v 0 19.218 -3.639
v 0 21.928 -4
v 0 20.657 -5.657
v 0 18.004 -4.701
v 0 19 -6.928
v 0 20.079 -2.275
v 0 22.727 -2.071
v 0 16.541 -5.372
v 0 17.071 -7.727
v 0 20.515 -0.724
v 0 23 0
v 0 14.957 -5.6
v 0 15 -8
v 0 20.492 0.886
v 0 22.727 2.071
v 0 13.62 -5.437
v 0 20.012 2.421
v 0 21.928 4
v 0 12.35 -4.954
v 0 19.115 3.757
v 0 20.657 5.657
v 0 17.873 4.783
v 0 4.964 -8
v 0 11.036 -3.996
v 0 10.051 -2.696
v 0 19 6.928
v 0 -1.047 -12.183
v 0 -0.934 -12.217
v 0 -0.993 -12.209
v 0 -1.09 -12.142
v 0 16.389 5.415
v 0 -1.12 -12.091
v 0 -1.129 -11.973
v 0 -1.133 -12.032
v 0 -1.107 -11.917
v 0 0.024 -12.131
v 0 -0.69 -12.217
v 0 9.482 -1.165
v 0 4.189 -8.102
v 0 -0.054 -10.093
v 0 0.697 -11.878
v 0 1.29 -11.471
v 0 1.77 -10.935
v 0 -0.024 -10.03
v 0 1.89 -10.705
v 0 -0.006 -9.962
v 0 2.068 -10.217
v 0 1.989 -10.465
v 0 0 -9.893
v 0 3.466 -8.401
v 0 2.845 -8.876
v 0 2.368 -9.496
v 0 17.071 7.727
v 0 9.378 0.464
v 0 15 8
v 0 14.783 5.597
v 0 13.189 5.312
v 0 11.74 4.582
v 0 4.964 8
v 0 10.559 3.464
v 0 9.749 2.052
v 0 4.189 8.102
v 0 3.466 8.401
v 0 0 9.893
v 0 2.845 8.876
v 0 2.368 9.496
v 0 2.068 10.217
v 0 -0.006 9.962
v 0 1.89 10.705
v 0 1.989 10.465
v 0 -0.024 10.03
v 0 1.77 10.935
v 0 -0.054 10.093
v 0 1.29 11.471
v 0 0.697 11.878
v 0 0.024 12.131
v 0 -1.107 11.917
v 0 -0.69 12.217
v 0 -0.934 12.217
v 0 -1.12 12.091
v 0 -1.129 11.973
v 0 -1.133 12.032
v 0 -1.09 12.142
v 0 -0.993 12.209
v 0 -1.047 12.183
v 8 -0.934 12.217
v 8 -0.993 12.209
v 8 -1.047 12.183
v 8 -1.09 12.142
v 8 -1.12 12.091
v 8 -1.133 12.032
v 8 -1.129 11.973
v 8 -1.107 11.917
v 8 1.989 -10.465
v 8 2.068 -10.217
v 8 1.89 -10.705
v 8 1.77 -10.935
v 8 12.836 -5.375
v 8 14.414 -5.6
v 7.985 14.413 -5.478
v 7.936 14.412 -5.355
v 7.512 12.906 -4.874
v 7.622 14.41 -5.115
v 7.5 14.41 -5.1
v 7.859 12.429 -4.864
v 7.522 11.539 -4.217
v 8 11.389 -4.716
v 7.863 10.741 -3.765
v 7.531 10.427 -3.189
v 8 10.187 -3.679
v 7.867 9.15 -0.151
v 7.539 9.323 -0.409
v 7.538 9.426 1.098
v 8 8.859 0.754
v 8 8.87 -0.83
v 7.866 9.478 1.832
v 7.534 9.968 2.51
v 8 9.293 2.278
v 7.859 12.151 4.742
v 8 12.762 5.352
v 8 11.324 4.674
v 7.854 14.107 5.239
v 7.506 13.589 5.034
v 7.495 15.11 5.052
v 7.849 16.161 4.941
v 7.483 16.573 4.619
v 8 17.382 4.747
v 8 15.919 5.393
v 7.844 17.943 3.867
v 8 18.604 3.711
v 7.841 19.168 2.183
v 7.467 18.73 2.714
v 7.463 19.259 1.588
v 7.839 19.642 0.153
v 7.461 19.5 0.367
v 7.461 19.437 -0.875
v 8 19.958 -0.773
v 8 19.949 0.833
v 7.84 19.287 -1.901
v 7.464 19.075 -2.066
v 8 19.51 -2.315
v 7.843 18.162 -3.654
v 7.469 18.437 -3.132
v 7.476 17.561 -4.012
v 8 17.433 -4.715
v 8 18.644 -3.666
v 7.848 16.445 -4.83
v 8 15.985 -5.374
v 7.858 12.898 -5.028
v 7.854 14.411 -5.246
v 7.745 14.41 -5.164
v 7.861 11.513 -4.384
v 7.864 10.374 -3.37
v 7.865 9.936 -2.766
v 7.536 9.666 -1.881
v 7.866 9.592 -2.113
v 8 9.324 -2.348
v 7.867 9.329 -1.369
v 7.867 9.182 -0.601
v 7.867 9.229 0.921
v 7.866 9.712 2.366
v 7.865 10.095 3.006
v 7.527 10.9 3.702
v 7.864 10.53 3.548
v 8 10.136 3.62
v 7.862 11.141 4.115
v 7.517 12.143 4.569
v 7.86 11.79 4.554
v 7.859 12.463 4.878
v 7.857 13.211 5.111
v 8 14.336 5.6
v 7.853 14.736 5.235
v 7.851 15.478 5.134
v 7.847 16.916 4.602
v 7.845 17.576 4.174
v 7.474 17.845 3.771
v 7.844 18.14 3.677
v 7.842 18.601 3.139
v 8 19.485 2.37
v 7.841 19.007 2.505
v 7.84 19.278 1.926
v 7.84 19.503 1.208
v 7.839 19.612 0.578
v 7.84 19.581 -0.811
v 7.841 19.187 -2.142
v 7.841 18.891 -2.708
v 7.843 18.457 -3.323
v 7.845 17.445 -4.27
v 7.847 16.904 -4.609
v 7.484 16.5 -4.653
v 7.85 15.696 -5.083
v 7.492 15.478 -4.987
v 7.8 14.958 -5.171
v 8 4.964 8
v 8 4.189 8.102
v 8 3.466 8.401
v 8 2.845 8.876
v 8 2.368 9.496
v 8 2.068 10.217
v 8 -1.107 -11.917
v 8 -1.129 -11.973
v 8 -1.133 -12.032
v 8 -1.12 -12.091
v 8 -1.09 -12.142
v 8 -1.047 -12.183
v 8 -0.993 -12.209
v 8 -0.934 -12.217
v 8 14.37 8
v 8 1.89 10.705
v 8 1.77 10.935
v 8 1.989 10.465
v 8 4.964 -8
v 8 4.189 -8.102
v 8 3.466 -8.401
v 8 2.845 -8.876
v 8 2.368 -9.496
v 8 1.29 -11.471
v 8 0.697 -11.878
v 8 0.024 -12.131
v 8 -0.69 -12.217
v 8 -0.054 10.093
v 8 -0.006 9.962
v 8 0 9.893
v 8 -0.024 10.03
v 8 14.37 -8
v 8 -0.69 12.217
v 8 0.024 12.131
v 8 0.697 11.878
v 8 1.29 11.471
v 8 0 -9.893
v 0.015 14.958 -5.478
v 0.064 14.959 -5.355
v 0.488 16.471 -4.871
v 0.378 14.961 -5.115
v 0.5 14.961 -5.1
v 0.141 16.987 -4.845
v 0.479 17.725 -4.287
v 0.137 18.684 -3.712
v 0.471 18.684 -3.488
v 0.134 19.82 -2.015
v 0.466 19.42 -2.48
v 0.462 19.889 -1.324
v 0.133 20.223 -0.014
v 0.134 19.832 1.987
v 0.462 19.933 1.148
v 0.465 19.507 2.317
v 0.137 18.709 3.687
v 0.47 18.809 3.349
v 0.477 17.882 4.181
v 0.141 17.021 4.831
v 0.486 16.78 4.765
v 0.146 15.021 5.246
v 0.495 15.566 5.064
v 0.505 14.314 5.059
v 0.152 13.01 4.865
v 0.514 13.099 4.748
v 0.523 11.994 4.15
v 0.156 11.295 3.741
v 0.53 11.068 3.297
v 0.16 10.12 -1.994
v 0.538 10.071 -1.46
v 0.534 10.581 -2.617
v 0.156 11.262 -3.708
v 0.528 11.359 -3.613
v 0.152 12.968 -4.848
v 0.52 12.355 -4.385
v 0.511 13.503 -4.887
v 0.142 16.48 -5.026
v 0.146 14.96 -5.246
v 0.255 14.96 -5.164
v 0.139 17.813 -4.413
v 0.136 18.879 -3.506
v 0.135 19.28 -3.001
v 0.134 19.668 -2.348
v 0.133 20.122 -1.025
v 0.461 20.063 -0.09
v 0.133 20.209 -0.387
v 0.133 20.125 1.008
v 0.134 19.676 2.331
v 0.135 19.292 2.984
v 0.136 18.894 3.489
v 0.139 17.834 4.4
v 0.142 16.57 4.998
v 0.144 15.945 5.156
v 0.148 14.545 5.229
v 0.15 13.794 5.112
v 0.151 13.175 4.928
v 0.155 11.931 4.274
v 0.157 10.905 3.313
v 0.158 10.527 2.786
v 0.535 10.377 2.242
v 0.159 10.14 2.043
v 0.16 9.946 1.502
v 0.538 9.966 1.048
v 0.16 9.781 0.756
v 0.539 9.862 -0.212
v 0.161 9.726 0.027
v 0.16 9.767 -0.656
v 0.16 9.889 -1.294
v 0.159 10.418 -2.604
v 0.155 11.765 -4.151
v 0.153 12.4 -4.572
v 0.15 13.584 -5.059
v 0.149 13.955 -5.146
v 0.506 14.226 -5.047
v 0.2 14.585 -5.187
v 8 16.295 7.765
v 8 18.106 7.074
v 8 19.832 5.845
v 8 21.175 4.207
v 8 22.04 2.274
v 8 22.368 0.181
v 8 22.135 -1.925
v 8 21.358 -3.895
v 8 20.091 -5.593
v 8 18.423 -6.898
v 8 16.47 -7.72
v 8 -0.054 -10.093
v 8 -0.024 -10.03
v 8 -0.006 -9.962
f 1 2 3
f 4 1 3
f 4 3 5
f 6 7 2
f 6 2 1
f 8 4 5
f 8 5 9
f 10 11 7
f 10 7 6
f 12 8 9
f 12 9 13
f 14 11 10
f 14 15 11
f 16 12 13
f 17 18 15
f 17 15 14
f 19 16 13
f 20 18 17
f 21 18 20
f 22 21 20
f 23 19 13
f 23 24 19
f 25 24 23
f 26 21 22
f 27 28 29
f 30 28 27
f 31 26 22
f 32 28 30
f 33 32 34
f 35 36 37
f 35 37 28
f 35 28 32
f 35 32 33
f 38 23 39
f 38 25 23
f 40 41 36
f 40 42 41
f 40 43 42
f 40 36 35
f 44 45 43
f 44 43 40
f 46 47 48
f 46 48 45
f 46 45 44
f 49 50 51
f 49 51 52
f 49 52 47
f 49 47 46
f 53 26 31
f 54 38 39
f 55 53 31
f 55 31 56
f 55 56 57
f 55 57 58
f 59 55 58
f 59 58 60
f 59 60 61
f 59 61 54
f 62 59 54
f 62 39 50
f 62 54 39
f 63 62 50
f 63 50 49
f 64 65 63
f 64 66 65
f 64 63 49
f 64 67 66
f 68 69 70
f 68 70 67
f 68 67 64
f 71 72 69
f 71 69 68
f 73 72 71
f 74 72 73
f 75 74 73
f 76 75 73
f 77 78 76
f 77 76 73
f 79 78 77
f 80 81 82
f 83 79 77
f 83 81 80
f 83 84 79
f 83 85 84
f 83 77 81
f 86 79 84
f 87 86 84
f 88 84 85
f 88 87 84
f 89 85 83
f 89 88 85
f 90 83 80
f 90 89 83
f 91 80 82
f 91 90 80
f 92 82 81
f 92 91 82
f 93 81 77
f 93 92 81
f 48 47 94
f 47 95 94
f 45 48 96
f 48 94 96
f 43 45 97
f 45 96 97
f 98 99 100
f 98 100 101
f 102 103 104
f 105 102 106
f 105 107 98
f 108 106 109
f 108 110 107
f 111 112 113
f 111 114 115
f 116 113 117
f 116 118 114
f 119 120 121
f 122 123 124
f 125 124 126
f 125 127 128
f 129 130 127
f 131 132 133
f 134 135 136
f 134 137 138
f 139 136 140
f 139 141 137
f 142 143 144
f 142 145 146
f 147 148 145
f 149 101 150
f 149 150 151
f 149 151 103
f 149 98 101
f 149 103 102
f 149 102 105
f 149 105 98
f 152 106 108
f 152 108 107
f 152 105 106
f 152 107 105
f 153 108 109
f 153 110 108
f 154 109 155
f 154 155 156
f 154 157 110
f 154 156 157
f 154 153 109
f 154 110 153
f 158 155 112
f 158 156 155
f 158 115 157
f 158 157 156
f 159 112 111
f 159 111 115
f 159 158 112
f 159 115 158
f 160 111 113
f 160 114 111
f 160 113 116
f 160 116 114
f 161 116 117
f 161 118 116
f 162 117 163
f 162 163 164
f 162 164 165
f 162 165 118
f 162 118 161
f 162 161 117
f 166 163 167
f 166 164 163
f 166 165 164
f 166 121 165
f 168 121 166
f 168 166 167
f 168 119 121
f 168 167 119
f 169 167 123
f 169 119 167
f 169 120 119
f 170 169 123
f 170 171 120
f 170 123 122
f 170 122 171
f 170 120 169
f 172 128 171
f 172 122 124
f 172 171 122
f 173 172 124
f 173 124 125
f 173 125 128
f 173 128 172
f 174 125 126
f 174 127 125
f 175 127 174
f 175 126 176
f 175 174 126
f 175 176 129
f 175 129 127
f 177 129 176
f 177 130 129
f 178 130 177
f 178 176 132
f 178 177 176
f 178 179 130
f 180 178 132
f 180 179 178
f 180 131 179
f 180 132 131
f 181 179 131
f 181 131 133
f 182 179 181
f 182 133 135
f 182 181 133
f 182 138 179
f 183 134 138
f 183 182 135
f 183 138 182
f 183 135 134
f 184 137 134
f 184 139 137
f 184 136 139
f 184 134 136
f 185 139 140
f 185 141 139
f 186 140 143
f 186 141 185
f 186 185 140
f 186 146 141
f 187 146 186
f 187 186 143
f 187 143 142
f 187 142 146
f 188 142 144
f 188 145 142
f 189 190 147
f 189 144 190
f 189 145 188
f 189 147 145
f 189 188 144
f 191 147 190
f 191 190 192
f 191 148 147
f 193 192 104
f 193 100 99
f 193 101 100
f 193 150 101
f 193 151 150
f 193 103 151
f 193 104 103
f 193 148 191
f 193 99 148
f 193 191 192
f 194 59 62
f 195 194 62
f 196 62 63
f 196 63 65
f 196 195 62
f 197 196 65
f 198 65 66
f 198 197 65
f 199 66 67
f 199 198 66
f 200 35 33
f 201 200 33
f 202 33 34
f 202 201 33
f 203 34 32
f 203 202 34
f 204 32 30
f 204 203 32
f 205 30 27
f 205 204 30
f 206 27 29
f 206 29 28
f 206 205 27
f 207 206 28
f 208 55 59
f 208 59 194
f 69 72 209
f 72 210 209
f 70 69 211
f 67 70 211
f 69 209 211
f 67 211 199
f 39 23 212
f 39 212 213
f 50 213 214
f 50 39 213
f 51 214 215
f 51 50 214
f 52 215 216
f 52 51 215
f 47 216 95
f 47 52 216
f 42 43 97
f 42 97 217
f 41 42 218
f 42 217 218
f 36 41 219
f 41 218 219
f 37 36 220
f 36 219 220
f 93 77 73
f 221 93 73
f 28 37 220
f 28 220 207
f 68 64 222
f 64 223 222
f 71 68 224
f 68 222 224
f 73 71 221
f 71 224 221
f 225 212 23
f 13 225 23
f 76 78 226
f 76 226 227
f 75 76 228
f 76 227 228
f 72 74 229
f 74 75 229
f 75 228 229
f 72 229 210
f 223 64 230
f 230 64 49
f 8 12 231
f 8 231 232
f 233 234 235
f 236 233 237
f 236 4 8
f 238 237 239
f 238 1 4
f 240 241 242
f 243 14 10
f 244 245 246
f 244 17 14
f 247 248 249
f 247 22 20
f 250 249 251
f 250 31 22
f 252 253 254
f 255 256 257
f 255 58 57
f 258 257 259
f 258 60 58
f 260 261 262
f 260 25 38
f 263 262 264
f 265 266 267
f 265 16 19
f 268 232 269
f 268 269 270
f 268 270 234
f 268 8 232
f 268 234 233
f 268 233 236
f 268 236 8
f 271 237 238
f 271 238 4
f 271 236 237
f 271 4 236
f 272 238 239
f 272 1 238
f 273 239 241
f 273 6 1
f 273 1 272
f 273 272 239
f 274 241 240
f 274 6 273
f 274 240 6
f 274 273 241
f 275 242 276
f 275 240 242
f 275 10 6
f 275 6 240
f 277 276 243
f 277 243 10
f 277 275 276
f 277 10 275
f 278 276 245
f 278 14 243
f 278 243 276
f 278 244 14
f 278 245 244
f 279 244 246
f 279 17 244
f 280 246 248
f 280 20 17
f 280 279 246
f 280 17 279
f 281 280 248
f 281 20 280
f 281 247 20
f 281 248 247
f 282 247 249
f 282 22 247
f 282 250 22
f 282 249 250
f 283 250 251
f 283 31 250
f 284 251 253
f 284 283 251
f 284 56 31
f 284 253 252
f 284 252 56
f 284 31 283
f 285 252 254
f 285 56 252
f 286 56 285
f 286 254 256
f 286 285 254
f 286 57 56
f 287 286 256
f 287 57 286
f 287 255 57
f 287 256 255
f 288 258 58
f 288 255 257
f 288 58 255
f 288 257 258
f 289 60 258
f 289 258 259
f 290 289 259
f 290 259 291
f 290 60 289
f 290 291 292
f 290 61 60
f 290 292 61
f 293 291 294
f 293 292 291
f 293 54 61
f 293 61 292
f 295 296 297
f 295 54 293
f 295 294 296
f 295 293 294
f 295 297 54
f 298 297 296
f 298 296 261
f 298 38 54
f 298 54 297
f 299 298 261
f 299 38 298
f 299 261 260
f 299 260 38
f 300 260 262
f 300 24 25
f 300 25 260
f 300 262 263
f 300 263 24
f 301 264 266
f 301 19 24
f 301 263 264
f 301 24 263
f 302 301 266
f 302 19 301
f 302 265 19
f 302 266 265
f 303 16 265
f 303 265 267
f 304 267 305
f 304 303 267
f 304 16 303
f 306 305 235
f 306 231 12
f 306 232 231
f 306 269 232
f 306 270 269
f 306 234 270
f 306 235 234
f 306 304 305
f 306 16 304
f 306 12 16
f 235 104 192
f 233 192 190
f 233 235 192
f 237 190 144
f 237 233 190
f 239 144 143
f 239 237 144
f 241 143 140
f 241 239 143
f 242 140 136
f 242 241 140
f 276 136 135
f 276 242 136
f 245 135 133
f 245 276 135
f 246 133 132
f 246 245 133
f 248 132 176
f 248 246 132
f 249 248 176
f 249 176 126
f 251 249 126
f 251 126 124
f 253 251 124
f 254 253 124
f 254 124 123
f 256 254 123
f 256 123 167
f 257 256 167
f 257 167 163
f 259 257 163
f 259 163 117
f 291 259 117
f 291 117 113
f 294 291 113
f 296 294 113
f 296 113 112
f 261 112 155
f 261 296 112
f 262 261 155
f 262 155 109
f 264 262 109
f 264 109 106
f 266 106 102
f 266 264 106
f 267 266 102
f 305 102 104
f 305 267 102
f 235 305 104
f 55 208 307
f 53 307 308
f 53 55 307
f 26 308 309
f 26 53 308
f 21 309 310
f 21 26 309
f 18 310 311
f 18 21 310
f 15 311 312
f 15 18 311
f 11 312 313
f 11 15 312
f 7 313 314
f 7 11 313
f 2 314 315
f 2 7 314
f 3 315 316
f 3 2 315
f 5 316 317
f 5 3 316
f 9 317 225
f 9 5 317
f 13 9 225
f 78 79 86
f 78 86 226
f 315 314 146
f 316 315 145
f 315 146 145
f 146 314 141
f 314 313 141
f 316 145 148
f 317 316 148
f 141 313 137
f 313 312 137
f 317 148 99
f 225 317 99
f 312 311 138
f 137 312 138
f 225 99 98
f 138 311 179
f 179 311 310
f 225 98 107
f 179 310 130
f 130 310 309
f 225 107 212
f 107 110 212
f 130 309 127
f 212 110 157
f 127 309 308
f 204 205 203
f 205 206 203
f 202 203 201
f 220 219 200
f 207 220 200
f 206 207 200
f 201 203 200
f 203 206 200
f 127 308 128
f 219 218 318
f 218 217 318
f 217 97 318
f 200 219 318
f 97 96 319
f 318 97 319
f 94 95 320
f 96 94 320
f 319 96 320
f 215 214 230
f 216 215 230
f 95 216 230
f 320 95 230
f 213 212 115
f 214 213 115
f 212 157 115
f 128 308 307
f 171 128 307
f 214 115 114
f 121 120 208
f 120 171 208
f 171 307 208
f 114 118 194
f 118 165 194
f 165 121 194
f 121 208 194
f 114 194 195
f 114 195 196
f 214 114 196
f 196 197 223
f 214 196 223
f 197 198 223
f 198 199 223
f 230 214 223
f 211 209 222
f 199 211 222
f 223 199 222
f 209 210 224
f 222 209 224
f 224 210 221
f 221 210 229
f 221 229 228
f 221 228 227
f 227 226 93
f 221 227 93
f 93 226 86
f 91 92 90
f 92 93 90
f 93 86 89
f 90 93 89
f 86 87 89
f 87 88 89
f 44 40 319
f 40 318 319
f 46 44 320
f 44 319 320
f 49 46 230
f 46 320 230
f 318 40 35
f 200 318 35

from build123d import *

# Parameters (mm, degrees)
BOSS_EXTRUDE1_DEPTH = 25
SKETCH3_R           = 5.1
CUT_EXTRUDE1_DEPTH  = 25
CUT_EXTRUDE2_DEPTH  = 25
FILLET1_R           = 0.5
BOSS_EXTRUDE3_DEPTH = 8
FILLET2_R           = 0.4
CUT_EXTRUDE3_DEPTH  = 8
FILLET4_R           = 3
FILLET5_R           = 3
FILLET6_R           = 3
FILLET7_R           = 0.2


with BuildPart() as part:
    # Sketch2 → Boss-Extrude1 (new body)
    with BuildSketch(Plane(origin=(0, 0, 0), x_dir=(1, 0, 0), z_dir=(0, 1, 0))):
        Polygon((0, 0), (0, -8), (8, -8), (8, 8), (0, 8), align=None)
    extrude(amount=BOSS_EXTRUDE1_DEPTH)

    # Sketch3 → Cut-Extrude1 (cut, along a direction that is not the sketch's normal)
    with BuildSketch(Plane(origin=(0, 0, 0), x_dir=(0, 0, -1), z_dir=(1, 0, 0))):
        with Locations((0, 15)):
            Circle(SKETCH3_R)
    extrude(amount=CUT_EXTRUDE1_DEPTH, dir=(0.9969173337331277, -0.07845909572784854, 0), mode=Mode.SUBTRACT)

    # Sketch4 → Cut-Extrude2 (cut, along a direction that is not the sketch's normal)
    with BuildSketch(Plane(origin=(0, 0, 0), x_dir=(0, 0, -1), z_dir=(1, 0, 0))):
        with BuildLine():
            Line((8, 15), (9.875195186, 15))
            Line((9.875195186, 15), (9.875195186, 26.385867588))
            Line((9.875195186, 26.385867588), (-10.505754032, 26.385867588))
            Line((-10.505754032, 26.385867588), (-10.505754032, 15))
            Line((-10.505754032, 15), (-8, 15))
            ThreePointArc((-8, 15), (0, 23), (8, 15))
        make_face()
    extrude(amount=CUT_EXTRUDE2_DEPTH, dir=(0.9969173337331277, -0.07845909572784854, 0), mode=Mode.SUBTRACT)

    # Fillet1
    fillet1_edges = [part.edges().sort_by_distance(p)[0] for p in [
        (0, 15, 5.1),
        (8, 14.370386346, 5.100000071),
    ]]
    fillet(fillet1_edges, radius=FILLET1_R)

    # Sketch5 → Boss-Extrude3 (add)
    with BuildSketch(Plane(origin=(0, 0, 0), x_dir=(0, 0, -1), z_dir=(1, 0, 0))):
        Polygon((10.535898385, 2), (-10.535898385, 2), (-16.21745197, -1.280246492), (-12.21745197, -1.280246492), (-10, 0), (10, 0), (12.21745197, -1.280246492), (16.21745197, -1.280246492), align=None)
    extrude(amount=BOSS_EXTRUDE3_DEPTH)

    # Fillet2
    fillet2_edges = [part.edges().sort_by_distance(p)[0] for p in [
        (4, 0, 10),
        (4, 0, -10),
    ]]
    fillet(fillet2_edges, radius=FILLET2_R)

    # Sketch6 → Cut-Extrude3 (cut)
    with BuildSketch(Plane(origin=(0, 0, 0), x_dir=(0, 0, -1), z_dir=(1, 0, 0))):
        Polygon((-12.21745197, -1.280246492), (-12.21745197, 1.727389059), (-17.377022548, 1.727389059), (-17.377022548, -2.102656652), (-12.21745197, -2.102656652), align=None)
        Polygon((12.21745197, -1.280246492), (12.21745197, 2.73049627), (17.312248613, 2.73049627), (17.312248613, -3.616436624), (12.21745197, -3.616436624), align=None)
    extrude(amount=CUT_EXTRUDE3_DEPTH, mode=Mode.SUBTRACT)

    # Fillet4
    # the kernel refuses this fillet: 3 mm, written as the material it adds along each edge
    with BuildSketch(Plane(origin=(8, 2, 8), x_dir=(0, 0, 1), z_dir=(-1, 0, 0))) as fillet4_piece_1:
        with BuildLine():
            CenterArc((3, 2.963884224), FILLET4_R, 180, 81.10057112)
            Line((0, 2.963884224), (-0.06, 2.963884224))
            Line((-0.06, 2.963884224), (-0.06, 0))
            Line((-0.06, 0), (0, -0.06))
            ThreePointArc((0, -0.06), (1.267949192, -0.06), (2.526616353, -0.059277684))
            Line((2.526616353, -0.059277684), (2.535898385, 0))
        make_face()
    extrude(amount=8)
    with BuildSketch(Plane(origin=(0, 2, -8), x_dir=(0, 1, 0), z_dir=(1, 0, 0))) as fillet4_piece_2:
        with BuildLine():
            CenterArc((2.963884224, -3), FILLET4_R, 90, 81.10057112)
            Line((0, -2.535898385), (-0.059277684, -2.526616353))
            ThreePointArc((-0.059277684, -2.526616353), (-0.06, -1.267949192), (-0.06, 0))
            Line((-0.06, 0), (0, 0.06))
            Line((0, 0.06), (2.963884224, 0.06))
            Line((2.963884224, 0.06), (2.963884224, 0))
        make_face()
    extrude(amount=8)

    # Fillet5
    fillet5_edges = [part.edges().sort_by_distance(p)[0] for p in [
        (4, 2, -10.535898385),
        (4, 2, 10.535898385),
    ]]
    fillet(fillet5_edges, radius=FILLET5_R)

    # Fillet6
    # the kernel refuses this fillet: 3 mm, written as the material it takes off along each edge
    with BuildSketch(Plane(origin=(12.298219074, 1.029154585, 12.21745197), x_dir=(0, 0.4999999999963209, -0.8660254037865628), z_dir=(-1, 0, 0))) as fillet6_piece_1:
        with BuildLine():
            CenterArc((1.738432397, 2.988946764), FILLET6_R, 210, 55.080112575)
            Line((-0.859643815, 1.488946764), (-0.911605339, 1.458946764))
            Line((-0.911605339, 1.458946764), (-0.051961524, -0.03))
            Line((-0.051961524, -0.03), (0, -0.06))
            ThreePointArc((0, -0.06), (0.740572073, -0.06), (1.47599838, -0.059778935))
            Line((1.47599838, -0.059778935), (1.481144145, 0))
        make_face()
    extrude(amount=16.596438148, mode=Mode.SUBTRACT)
    with BuildSketch(Plane(origin=(12.298219074, 1.029154585, -12.21745197), x_dir=(0, 0.4999999999963147, 0.8660254037865663), z_dir=(-1, 0, 0))) as fillet6_piece_2:
        with BuildLine():
            CenterArc((1.738432397, -2.988946764), FILLET6_R, 94.919887425, 55.080112575)
            Line((-0.859643815, -1.488946764), (-0.911605339, -1.458946764))
            Line((-0.911605339, -1.458946764), (-0.051961524, 0.03))
            Line((-0.051961524, 0.03), (0, 0.06))
            ThreePointArc((0, 0.06), (0.740572073, 0.06), (1.47599838, 0.059778935))
            Line((1.47599838, 0.059778935), (1.481144145, 0))
        make_face()
    extrude(amount=16.596438148, mode=Mode.SUBTRACT)

    # Fillet7
    fillet7_edges = [part.edges().sort_by_distance(p)[0] for p in [
        (4, -1.280246492, 12.21745197),
        (4, -1.280246492, -12.21745197),
    ]]
    fillet(fillet7_edges, radius=FILLET7_R)


solid = part.part
